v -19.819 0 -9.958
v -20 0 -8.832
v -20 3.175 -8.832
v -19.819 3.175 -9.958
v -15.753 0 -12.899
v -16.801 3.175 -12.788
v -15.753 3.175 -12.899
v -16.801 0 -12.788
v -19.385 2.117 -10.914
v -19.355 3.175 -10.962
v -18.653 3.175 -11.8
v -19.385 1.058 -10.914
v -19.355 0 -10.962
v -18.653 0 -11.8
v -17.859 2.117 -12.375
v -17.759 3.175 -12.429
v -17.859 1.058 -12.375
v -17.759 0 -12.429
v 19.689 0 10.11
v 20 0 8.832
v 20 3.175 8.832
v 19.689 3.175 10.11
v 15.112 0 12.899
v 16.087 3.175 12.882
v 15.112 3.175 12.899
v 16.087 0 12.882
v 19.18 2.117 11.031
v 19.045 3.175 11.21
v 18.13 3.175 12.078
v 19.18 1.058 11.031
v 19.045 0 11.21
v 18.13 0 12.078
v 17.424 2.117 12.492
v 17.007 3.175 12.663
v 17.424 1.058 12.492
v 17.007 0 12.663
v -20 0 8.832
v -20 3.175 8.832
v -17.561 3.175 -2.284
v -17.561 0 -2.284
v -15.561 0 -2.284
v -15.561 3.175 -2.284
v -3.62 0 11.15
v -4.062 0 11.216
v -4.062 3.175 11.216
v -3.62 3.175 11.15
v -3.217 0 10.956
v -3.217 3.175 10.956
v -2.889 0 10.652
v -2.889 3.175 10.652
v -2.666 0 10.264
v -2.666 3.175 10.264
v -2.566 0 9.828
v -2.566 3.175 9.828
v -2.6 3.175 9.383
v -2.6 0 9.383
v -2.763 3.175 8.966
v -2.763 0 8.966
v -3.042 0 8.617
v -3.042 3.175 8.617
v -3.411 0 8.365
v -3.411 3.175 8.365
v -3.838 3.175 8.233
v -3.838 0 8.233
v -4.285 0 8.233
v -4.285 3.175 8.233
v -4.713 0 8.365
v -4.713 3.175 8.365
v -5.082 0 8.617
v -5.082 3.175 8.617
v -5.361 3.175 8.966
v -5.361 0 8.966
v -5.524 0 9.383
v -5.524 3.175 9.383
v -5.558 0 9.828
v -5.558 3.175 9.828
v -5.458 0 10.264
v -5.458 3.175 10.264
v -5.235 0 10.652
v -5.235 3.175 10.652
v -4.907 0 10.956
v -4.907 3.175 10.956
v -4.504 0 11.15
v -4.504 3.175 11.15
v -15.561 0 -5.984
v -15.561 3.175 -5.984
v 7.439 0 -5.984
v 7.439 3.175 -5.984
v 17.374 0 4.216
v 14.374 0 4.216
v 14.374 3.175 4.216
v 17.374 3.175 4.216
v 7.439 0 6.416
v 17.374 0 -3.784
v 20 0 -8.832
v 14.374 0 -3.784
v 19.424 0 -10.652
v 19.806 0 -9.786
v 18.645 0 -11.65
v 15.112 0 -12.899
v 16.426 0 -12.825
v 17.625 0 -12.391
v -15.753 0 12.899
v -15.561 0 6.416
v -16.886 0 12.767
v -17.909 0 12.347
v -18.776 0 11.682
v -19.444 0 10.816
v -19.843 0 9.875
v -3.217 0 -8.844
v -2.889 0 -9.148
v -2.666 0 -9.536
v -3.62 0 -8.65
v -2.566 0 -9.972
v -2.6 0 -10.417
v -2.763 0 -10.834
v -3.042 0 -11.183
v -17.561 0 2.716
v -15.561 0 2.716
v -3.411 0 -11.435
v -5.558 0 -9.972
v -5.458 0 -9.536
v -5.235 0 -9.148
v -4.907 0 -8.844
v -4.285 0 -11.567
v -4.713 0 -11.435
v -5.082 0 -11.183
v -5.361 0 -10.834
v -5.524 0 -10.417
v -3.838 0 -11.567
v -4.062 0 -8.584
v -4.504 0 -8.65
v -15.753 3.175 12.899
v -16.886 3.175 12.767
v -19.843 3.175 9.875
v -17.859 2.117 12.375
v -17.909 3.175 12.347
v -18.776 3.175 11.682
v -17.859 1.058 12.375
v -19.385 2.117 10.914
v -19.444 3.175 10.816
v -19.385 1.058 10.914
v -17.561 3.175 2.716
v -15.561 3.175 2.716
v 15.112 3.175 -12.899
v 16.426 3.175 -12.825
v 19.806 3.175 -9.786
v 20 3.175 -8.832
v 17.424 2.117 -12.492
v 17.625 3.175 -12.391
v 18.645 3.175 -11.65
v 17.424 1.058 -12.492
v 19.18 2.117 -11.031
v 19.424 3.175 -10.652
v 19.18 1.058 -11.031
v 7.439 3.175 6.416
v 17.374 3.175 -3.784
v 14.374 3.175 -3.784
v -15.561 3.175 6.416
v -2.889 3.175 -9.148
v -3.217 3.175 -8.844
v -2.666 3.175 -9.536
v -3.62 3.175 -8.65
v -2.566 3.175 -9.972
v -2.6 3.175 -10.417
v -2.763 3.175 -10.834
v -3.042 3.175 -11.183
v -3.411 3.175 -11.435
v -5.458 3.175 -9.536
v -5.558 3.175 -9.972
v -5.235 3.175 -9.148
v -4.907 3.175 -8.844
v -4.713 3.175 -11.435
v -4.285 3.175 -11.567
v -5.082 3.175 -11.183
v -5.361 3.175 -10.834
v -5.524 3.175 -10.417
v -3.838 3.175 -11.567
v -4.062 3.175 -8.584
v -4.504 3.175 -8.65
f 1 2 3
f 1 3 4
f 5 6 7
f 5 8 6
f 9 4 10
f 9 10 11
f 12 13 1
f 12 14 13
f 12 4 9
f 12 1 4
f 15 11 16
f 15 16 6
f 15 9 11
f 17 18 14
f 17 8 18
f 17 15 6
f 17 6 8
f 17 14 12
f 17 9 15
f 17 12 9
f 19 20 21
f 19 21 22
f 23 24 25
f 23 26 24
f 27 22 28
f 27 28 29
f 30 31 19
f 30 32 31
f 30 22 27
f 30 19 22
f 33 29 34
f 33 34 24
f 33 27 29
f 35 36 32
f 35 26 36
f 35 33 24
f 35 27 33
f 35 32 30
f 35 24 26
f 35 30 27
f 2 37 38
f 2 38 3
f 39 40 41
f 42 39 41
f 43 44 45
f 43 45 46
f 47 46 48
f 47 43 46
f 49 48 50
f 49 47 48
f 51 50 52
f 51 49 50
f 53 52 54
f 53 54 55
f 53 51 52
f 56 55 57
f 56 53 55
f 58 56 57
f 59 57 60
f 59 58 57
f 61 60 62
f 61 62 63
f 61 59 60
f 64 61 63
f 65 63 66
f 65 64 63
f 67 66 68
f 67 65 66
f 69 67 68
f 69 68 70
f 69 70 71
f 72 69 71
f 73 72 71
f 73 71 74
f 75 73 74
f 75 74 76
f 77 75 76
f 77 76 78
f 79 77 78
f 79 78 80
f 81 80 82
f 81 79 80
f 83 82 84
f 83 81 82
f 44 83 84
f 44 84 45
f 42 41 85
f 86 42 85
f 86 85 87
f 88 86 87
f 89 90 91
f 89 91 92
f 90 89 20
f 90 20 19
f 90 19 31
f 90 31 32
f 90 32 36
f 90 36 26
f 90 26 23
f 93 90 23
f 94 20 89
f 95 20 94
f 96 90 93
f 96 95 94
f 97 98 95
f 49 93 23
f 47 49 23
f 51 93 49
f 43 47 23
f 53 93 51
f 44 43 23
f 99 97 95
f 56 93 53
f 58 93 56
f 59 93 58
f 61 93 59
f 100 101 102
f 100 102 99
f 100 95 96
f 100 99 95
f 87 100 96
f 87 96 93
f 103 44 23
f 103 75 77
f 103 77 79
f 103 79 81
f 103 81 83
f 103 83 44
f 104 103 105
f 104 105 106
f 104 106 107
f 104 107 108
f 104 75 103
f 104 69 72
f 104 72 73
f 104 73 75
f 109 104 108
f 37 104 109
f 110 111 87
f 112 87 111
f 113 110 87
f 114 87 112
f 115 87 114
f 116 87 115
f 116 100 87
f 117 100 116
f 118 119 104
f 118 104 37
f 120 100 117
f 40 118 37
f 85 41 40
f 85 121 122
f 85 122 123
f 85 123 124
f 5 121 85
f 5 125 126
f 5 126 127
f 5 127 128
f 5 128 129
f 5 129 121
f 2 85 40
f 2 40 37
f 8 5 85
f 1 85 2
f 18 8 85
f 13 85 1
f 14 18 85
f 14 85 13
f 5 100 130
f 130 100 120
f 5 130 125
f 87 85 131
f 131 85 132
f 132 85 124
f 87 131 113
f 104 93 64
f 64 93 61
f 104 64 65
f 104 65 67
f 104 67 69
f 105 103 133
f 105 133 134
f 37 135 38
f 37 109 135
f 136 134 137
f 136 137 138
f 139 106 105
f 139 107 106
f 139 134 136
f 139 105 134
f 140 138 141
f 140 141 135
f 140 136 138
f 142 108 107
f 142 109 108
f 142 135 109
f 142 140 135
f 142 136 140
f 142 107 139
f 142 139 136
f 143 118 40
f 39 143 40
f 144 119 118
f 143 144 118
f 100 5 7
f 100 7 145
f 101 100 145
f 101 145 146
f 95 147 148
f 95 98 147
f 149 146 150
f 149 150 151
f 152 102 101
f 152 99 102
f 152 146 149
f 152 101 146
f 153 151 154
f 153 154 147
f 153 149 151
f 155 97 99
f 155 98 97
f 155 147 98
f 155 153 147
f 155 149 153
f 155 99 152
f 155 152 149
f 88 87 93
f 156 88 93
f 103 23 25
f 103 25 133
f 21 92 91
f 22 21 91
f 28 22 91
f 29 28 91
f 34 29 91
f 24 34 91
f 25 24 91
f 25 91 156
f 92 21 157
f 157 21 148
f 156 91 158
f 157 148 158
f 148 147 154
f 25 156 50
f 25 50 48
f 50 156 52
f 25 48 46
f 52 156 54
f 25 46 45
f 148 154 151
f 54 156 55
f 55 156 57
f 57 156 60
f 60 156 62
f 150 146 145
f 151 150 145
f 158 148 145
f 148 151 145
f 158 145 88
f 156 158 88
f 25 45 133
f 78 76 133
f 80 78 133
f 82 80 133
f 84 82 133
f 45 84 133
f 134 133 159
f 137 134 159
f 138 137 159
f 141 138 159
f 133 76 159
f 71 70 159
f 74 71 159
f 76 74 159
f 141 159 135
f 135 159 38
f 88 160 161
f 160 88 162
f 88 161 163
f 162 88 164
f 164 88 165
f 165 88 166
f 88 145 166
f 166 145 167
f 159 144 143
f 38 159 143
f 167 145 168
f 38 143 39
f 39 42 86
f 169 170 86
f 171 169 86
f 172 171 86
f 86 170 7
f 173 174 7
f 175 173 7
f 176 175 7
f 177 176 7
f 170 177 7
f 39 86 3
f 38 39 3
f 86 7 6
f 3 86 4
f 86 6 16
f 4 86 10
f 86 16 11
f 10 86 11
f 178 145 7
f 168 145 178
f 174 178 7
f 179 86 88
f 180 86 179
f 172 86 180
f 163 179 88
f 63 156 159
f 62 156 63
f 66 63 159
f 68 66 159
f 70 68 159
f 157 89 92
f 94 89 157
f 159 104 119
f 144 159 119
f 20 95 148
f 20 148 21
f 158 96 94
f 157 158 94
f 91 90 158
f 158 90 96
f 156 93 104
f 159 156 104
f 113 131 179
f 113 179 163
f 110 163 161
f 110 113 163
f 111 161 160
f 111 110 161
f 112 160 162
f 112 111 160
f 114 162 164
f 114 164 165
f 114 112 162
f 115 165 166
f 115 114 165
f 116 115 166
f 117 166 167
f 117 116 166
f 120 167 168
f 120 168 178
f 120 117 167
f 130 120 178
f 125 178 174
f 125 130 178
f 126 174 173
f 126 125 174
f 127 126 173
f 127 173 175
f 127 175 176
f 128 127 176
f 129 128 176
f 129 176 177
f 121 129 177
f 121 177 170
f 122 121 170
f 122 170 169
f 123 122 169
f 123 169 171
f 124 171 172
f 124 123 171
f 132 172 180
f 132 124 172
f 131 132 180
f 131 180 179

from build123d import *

# Parameters (mm, degrees)
SKETCH1_R           = 1.499950003
SKETCH1_R_2         = 1.49995001
SKETCH1_W           = 3.0001
SKETCH1_H           = 8
BOSS_EXTRUDE1_DEPTH = 3.175


with BuildPart() as part:
    # Sketch1 → Boss-Extrude1 (new body)
    with BuildSketch(Plane(origin=(0, 0, 0), x_dir=(1, 0, 0), z_dir=(0, 1, 0))):
        with BuildLine():
            Line((-15.7526, 12.89915), (15.1125, 12.89915))
            add(Edge.make_bspline(
                [(15.1125, 12.89915), (17.575103024, 13.12464748), (19.77450252, 11.294353024), (20, 8.83175)],
                knots=[0.111111111, 0.111111111, 0.111111111, 0.111111111, 0.222222222, 0.222222222, 0.222222222, 0.222222222], degree=3))
            Line((20, 8.83175), (20, -8.83175))
            add(Edge.make_bspline(
                [(20, -8.83175), (19.77450252, -11.294353024), (17.575103024, -13.12464748), (15.1125, -12.89915)],
                knots=[0.333333333, 0.333333333, 0.333333333, 0.333333333, 0.444444444, 0.444444444, 0.444444444, 0.444444444], degree=3))
            Line((15.1125, -12.89915), (-15.7526, -12.89915))
            add(Edge.make_bspline(
                [(-15.7526, -12.89915), (-18.039200664, -12.948650664), (-19.950499336, -11.118350664), (-20, -8.83175)],
                knots=[0.555555556, 0.555555556, 0.555555556, 0.555555556, 0.666666667, 0.666666667, 0.666666667, 0.666666667], degree=3))
            Line((-20, -8.83175), (-20, 8.83175))
            add(Edge.make_bspline(
                [(-20, 8.83175), (-19.950499336, 11.118350664), (-18.039200664, 12.948650664), (-15.7526, 12.89915)],
                knots=[0.777777778, 0.777777778, 0.777777778, 0.777777778, 1, 1, 1, 1], degree=3))
        make_face()
        with Locations(Location((-4.06191002, 10.083599991, 0), (0, 0, 270))):
            Circle(SKETCH1_R, mode=Mode.SUBTRACT)
        with Locations(Location((-4.06191002, -9.71635, 0), (0, 0, 270))):
            Circle(SKETCH1_R_2, mode=Mode.SUBTRACT)
        Polygon((-15.5612, 5.98375), (7.4388, 5.98375), (7.4388, -6.41625), (-15.5612, -6.41625), (-15.5612, -2.71635), (-17.5613, -2.71635), (-17.5613, 2.28365), (-15.5612, 2.28365), align=None, mode=Mode.SUBTRACT)
        with Locations((15.87435, -0.21635)):
            Rectangle(SKETCH1_W, SKETCH1_H, mode=Mode.SUBTRACT)
    extrude(amount=BOSS_EXTRUDE1_DEPTH)


solid = part.part
